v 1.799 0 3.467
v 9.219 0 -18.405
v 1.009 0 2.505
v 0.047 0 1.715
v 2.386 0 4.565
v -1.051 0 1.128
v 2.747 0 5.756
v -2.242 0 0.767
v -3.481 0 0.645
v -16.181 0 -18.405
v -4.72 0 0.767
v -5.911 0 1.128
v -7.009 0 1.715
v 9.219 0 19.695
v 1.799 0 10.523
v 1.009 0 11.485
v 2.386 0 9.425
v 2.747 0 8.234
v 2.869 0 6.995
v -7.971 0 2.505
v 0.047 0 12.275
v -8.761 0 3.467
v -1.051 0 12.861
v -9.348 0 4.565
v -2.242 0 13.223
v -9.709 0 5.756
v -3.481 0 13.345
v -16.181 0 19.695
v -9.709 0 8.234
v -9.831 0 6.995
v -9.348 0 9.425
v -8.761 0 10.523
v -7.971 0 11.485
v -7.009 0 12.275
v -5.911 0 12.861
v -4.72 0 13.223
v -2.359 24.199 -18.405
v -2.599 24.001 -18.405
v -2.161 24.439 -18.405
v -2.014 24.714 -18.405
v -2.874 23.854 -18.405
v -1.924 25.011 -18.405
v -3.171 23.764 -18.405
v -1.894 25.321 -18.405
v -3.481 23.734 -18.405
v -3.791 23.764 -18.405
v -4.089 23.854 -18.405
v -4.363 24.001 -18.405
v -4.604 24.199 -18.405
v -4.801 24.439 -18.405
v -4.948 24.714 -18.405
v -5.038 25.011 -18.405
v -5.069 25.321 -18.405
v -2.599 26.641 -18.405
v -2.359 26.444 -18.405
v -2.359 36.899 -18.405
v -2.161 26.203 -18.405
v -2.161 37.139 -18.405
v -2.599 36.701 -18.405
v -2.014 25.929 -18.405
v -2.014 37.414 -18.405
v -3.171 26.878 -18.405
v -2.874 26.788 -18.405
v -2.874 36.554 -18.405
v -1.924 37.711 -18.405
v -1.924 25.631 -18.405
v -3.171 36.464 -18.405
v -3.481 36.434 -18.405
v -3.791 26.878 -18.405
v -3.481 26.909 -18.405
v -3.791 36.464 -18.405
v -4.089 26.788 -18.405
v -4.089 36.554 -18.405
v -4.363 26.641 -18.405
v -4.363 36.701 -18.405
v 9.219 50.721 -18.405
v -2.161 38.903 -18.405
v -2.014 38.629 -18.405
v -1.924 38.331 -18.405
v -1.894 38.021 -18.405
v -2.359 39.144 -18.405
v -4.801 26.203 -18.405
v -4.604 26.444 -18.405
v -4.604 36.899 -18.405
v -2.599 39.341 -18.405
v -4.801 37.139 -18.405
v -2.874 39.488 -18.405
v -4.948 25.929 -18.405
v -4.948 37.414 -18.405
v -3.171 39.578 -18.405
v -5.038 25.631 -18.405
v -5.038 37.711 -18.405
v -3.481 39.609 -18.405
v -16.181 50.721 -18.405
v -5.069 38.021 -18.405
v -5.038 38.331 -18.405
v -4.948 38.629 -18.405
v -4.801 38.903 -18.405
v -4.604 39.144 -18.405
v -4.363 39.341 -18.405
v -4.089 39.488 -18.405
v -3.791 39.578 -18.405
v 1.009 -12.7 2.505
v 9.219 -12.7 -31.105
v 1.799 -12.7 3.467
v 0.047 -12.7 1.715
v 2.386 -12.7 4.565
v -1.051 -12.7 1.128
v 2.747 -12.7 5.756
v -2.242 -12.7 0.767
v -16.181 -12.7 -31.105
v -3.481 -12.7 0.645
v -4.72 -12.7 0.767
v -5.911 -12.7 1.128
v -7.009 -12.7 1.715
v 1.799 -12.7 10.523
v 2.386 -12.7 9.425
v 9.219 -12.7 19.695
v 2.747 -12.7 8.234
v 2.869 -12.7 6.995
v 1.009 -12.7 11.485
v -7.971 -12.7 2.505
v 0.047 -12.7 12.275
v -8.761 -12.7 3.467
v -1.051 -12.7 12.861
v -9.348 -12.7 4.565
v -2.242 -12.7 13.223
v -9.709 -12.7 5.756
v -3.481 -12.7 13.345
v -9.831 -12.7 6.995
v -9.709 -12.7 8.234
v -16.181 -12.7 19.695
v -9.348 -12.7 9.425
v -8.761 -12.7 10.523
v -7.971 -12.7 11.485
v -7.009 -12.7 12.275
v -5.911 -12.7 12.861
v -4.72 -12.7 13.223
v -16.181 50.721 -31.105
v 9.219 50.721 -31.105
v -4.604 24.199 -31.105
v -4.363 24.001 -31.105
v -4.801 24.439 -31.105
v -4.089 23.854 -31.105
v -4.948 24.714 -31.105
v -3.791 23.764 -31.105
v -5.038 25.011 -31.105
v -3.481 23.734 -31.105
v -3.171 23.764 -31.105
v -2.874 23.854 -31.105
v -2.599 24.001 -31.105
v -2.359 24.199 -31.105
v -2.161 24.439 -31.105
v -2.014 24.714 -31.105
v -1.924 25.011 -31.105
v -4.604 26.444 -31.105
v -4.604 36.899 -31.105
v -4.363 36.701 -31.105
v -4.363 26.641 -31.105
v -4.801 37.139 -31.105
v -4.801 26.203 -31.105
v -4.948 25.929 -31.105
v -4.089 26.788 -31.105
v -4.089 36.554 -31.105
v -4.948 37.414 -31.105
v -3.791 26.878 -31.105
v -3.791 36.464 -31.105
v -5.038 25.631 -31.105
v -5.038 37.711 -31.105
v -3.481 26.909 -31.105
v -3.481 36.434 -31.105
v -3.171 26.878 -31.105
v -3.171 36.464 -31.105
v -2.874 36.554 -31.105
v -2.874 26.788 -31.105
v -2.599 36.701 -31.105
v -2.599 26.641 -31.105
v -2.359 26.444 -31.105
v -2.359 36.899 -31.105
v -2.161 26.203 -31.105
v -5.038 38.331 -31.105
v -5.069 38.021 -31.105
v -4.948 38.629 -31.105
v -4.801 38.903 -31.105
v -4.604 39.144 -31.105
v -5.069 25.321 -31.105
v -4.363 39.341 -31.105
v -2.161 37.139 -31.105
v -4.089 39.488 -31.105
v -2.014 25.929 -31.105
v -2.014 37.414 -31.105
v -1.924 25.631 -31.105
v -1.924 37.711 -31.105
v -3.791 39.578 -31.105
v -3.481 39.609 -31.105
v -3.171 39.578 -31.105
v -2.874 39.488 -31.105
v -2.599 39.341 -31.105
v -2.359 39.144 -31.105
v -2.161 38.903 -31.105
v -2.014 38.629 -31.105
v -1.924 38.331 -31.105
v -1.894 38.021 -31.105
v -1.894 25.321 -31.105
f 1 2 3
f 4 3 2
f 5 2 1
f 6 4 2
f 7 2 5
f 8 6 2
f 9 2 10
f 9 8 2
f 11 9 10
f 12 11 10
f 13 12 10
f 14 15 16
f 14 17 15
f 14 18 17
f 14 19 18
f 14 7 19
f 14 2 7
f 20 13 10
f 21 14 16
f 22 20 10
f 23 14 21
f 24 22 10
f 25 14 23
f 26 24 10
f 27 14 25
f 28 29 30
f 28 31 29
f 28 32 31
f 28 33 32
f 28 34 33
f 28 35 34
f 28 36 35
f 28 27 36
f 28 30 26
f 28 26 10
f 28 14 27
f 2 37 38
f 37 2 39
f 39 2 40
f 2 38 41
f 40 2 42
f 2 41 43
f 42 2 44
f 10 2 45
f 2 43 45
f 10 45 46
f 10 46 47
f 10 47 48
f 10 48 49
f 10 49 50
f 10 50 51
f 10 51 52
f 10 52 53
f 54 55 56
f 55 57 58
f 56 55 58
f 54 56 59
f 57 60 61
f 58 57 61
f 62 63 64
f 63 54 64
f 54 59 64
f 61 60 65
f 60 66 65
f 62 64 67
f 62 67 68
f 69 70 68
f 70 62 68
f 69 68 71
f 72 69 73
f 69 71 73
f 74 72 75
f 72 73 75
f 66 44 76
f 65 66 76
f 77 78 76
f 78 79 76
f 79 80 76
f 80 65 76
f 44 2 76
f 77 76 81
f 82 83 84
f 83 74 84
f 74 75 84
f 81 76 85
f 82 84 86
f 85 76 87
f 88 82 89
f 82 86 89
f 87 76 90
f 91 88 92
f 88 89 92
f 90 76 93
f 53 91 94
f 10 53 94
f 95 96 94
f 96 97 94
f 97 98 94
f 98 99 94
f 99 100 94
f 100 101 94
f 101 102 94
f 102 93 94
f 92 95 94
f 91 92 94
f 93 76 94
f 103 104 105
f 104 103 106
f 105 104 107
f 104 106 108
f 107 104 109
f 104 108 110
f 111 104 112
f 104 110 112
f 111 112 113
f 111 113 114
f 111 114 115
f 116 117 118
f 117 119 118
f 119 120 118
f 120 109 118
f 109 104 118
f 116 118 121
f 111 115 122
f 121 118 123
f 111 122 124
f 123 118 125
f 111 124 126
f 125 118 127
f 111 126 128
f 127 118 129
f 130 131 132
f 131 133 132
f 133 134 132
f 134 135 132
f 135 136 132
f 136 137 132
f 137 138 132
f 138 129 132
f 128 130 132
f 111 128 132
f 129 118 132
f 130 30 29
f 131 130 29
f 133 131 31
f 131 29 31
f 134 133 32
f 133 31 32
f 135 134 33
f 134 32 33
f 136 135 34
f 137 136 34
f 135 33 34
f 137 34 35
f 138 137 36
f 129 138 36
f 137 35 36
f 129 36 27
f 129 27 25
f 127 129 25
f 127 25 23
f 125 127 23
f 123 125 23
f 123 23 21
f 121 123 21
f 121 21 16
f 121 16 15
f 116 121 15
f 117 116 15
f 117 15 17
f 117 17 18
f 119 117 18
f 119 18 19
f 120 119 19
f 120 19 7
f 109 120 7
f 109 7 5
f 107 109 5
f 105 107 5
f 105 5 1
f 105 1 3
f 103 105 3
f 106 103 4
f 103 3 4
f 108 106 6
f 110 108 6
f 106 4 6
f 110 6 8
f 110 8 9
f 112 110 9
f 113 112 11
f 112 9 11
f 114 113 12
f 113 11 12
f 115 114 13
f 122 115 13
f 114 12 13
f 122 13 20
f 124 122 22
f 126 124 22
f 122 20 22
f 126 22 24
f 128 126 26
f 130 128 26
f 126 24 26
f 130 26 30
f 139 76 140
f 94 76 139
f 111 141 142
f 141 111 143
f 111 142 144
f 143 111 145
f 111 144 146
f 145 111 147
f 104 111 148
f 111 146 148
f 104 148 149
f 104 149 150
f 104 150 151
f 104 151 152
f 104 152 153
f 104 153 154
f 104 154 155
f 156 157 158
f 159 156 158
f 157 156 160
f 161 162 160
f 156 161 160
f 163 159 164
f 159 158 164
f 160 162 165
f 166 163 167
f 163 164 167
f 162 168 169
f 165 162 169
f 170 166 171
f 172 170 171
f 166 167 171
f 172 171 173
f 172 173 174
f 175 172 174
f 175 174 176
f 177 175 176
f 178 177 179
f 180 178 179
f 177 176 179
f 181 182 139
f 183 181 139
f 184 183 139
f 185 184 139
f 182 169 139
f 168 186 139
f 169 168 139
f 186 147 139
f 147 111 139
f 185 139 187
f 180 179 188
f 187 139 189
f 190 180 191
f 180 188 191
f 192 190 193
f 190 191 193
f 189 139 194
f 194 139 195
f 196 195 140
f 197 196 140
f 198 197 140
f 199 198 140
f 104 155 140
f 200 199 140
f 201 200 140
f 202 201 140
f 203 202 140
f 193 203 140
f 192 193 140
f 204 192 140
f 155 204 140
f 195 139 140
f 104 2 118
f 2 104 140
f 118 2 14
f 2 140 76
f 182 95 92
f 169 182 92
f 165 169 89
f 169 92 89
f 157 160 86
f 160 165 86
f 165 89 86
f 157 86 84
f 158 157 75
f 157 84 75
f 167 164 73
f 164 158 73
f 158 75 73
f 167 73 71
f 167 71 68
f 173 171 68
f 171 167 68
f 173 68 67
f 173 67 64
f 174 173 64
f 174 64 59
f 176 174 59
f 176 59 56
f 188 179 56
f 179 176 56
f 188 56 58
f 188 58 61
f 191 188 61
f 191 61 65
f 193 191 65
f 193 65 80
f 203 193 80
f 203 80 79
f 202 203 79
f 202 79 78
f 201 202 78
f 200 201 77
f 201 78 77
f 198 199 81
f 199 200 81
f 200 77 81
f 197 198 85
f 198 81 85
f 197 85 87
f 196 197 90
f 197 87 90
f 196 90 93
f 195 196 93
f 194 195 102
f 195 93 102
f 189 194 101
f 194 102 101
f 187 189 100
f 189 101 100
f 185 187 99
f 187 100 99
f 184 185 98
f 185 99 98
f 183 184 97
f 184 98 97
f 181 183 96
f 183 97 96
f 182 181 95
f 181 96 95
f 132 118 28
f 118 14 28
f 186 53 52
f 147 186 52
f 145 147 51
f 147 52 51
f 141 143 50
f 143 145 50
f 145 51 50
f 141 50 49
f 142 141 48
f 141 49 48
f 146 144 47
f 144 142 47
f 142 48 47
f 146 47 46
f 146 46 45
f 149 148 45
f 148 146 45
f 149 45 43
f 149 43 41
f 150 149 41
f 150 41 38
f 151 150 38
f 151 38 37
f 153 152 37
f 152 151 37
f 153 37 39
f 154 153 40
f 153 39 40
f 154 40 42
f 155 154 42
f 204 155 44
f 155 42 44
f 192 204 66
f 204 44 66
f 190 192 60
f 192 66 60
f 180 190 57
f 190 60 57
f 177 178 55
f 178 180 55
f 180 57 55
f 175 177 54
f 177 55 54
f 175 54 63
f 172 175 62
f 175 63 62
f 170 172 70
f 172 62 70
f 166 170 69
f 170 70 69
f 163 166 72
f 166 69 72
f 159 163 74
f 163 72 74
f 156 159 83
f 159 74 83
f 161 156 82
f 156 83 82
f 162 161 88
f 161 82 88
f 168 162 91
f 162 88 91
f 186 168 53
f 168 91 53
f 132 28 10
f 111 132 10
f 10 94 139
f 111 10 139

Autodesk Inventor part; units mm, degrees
ref_plane "YZ Plane" through (0, 0, 0) normal (1, 0, 0) x (0, 1, 0)
ref_plane "XZ Plane" through (0, 0, 0) normal (0, 1, 0) x (-1, 0, 0)
ref_plane "XY Plane" through (0, 0, 0) normal (0, 0, 1) x (1, 0, 0)
sketch "Sketch1" plane through (0, 0, 0) normal (0, 1, 0) x (-1, 0, 0)
  circle A0 centre (3.4811, 6.9947) radius 6.35
  line L0 (-9.2189, 19.6947) -> (16.1811, 19.6947)
  line L1 (16.1811, 19.6947) -> (16.1811, -18.4053)
  line L2 (16.1811, -18.4053) -> (-9.2189, -18.4053)
  line L3 (-9.2189, -18.4053) -> (-9.2189, 19.6947)
  line L4 (16.1811, -18.4053) -> (16.1811, -31.1053)
  line L5 (16.1811, -31.1053) -> (-9.2189, -31.1053)
  line L6 (-9.2189, -31.1053) -> (-9.2189, -18.4053)
  point P0 (0, 0)
  dimension "d0" = 12.7
  dimension "d1" = 25.4
  dimension "d2" = 38.1
  dimension "d3" = 12.7
  dimension "d4" = 12.7
  dimension "d36" = 12.7
ref_plane "Work Plane1" through (9.2189, 0, -18.4053) normal (0, 0, -1) x (-1, 0, 0)
sketch "Sketch3" plane through (9.2189, 0, -18.4053) normal (0, 0, -1) x (-1, 0, 0)
  line L0 (25.4, 0) -> (0, 0) projected
  line L1 (12.7, 0) -> (12.7, 50.8)
  line L2 (0, 50.8) -> (25.4, 50.8) projected
  circle A0 centre (12.7, 25.4) radius 1.5875
  circle A1 centre (12.7, 38.1) radius 1.5875
  point P0 (9.2189, 0)
  dimension "d23" = 3.175
  dimension "d24" = 3.175
  dimension "d25" = 25.4
  dimension "d26" = 12.7
ref_plane "Work Plane2" through (9.2189, -0.0789, -18.4053) normal (0, 0, -1) x (-1, 0, 0)
sketch "Sketch4" plane through (9.2189, -0.0789, -18.4053) normal (0, 0, -1) x (-1, 0, 0)
  line L0 (25.4, 0) -> (0, 0)
  line L1 (0, 50.8) -> (25.4, 50.8)
  circle A0 centre (12.7, 25.4) radius 1.5875
  circle A1 centre (12.7, 38.1) radius 1.5875
  line L2 (0, 50.8) -> (0, 0)
  line L3 (0, 0) -> (25.4, 0)
  line L4 (25.4, 0) -> (25.4, 50.8)
  point P0 (9.2189, 0)
  dimension "d30" = 3.175
  dimension "d31" = 3.175
  dimension "d32" = 25.4
  dimension "d29" = 12.7
extrude "Extrusion7" add sketch "Sketch1" against normal blind 12.7
extrude "Extrusion8" add sketch "Sketch4" along normal blind 12.7
properties part number "Cylinder Cutting Jig"
